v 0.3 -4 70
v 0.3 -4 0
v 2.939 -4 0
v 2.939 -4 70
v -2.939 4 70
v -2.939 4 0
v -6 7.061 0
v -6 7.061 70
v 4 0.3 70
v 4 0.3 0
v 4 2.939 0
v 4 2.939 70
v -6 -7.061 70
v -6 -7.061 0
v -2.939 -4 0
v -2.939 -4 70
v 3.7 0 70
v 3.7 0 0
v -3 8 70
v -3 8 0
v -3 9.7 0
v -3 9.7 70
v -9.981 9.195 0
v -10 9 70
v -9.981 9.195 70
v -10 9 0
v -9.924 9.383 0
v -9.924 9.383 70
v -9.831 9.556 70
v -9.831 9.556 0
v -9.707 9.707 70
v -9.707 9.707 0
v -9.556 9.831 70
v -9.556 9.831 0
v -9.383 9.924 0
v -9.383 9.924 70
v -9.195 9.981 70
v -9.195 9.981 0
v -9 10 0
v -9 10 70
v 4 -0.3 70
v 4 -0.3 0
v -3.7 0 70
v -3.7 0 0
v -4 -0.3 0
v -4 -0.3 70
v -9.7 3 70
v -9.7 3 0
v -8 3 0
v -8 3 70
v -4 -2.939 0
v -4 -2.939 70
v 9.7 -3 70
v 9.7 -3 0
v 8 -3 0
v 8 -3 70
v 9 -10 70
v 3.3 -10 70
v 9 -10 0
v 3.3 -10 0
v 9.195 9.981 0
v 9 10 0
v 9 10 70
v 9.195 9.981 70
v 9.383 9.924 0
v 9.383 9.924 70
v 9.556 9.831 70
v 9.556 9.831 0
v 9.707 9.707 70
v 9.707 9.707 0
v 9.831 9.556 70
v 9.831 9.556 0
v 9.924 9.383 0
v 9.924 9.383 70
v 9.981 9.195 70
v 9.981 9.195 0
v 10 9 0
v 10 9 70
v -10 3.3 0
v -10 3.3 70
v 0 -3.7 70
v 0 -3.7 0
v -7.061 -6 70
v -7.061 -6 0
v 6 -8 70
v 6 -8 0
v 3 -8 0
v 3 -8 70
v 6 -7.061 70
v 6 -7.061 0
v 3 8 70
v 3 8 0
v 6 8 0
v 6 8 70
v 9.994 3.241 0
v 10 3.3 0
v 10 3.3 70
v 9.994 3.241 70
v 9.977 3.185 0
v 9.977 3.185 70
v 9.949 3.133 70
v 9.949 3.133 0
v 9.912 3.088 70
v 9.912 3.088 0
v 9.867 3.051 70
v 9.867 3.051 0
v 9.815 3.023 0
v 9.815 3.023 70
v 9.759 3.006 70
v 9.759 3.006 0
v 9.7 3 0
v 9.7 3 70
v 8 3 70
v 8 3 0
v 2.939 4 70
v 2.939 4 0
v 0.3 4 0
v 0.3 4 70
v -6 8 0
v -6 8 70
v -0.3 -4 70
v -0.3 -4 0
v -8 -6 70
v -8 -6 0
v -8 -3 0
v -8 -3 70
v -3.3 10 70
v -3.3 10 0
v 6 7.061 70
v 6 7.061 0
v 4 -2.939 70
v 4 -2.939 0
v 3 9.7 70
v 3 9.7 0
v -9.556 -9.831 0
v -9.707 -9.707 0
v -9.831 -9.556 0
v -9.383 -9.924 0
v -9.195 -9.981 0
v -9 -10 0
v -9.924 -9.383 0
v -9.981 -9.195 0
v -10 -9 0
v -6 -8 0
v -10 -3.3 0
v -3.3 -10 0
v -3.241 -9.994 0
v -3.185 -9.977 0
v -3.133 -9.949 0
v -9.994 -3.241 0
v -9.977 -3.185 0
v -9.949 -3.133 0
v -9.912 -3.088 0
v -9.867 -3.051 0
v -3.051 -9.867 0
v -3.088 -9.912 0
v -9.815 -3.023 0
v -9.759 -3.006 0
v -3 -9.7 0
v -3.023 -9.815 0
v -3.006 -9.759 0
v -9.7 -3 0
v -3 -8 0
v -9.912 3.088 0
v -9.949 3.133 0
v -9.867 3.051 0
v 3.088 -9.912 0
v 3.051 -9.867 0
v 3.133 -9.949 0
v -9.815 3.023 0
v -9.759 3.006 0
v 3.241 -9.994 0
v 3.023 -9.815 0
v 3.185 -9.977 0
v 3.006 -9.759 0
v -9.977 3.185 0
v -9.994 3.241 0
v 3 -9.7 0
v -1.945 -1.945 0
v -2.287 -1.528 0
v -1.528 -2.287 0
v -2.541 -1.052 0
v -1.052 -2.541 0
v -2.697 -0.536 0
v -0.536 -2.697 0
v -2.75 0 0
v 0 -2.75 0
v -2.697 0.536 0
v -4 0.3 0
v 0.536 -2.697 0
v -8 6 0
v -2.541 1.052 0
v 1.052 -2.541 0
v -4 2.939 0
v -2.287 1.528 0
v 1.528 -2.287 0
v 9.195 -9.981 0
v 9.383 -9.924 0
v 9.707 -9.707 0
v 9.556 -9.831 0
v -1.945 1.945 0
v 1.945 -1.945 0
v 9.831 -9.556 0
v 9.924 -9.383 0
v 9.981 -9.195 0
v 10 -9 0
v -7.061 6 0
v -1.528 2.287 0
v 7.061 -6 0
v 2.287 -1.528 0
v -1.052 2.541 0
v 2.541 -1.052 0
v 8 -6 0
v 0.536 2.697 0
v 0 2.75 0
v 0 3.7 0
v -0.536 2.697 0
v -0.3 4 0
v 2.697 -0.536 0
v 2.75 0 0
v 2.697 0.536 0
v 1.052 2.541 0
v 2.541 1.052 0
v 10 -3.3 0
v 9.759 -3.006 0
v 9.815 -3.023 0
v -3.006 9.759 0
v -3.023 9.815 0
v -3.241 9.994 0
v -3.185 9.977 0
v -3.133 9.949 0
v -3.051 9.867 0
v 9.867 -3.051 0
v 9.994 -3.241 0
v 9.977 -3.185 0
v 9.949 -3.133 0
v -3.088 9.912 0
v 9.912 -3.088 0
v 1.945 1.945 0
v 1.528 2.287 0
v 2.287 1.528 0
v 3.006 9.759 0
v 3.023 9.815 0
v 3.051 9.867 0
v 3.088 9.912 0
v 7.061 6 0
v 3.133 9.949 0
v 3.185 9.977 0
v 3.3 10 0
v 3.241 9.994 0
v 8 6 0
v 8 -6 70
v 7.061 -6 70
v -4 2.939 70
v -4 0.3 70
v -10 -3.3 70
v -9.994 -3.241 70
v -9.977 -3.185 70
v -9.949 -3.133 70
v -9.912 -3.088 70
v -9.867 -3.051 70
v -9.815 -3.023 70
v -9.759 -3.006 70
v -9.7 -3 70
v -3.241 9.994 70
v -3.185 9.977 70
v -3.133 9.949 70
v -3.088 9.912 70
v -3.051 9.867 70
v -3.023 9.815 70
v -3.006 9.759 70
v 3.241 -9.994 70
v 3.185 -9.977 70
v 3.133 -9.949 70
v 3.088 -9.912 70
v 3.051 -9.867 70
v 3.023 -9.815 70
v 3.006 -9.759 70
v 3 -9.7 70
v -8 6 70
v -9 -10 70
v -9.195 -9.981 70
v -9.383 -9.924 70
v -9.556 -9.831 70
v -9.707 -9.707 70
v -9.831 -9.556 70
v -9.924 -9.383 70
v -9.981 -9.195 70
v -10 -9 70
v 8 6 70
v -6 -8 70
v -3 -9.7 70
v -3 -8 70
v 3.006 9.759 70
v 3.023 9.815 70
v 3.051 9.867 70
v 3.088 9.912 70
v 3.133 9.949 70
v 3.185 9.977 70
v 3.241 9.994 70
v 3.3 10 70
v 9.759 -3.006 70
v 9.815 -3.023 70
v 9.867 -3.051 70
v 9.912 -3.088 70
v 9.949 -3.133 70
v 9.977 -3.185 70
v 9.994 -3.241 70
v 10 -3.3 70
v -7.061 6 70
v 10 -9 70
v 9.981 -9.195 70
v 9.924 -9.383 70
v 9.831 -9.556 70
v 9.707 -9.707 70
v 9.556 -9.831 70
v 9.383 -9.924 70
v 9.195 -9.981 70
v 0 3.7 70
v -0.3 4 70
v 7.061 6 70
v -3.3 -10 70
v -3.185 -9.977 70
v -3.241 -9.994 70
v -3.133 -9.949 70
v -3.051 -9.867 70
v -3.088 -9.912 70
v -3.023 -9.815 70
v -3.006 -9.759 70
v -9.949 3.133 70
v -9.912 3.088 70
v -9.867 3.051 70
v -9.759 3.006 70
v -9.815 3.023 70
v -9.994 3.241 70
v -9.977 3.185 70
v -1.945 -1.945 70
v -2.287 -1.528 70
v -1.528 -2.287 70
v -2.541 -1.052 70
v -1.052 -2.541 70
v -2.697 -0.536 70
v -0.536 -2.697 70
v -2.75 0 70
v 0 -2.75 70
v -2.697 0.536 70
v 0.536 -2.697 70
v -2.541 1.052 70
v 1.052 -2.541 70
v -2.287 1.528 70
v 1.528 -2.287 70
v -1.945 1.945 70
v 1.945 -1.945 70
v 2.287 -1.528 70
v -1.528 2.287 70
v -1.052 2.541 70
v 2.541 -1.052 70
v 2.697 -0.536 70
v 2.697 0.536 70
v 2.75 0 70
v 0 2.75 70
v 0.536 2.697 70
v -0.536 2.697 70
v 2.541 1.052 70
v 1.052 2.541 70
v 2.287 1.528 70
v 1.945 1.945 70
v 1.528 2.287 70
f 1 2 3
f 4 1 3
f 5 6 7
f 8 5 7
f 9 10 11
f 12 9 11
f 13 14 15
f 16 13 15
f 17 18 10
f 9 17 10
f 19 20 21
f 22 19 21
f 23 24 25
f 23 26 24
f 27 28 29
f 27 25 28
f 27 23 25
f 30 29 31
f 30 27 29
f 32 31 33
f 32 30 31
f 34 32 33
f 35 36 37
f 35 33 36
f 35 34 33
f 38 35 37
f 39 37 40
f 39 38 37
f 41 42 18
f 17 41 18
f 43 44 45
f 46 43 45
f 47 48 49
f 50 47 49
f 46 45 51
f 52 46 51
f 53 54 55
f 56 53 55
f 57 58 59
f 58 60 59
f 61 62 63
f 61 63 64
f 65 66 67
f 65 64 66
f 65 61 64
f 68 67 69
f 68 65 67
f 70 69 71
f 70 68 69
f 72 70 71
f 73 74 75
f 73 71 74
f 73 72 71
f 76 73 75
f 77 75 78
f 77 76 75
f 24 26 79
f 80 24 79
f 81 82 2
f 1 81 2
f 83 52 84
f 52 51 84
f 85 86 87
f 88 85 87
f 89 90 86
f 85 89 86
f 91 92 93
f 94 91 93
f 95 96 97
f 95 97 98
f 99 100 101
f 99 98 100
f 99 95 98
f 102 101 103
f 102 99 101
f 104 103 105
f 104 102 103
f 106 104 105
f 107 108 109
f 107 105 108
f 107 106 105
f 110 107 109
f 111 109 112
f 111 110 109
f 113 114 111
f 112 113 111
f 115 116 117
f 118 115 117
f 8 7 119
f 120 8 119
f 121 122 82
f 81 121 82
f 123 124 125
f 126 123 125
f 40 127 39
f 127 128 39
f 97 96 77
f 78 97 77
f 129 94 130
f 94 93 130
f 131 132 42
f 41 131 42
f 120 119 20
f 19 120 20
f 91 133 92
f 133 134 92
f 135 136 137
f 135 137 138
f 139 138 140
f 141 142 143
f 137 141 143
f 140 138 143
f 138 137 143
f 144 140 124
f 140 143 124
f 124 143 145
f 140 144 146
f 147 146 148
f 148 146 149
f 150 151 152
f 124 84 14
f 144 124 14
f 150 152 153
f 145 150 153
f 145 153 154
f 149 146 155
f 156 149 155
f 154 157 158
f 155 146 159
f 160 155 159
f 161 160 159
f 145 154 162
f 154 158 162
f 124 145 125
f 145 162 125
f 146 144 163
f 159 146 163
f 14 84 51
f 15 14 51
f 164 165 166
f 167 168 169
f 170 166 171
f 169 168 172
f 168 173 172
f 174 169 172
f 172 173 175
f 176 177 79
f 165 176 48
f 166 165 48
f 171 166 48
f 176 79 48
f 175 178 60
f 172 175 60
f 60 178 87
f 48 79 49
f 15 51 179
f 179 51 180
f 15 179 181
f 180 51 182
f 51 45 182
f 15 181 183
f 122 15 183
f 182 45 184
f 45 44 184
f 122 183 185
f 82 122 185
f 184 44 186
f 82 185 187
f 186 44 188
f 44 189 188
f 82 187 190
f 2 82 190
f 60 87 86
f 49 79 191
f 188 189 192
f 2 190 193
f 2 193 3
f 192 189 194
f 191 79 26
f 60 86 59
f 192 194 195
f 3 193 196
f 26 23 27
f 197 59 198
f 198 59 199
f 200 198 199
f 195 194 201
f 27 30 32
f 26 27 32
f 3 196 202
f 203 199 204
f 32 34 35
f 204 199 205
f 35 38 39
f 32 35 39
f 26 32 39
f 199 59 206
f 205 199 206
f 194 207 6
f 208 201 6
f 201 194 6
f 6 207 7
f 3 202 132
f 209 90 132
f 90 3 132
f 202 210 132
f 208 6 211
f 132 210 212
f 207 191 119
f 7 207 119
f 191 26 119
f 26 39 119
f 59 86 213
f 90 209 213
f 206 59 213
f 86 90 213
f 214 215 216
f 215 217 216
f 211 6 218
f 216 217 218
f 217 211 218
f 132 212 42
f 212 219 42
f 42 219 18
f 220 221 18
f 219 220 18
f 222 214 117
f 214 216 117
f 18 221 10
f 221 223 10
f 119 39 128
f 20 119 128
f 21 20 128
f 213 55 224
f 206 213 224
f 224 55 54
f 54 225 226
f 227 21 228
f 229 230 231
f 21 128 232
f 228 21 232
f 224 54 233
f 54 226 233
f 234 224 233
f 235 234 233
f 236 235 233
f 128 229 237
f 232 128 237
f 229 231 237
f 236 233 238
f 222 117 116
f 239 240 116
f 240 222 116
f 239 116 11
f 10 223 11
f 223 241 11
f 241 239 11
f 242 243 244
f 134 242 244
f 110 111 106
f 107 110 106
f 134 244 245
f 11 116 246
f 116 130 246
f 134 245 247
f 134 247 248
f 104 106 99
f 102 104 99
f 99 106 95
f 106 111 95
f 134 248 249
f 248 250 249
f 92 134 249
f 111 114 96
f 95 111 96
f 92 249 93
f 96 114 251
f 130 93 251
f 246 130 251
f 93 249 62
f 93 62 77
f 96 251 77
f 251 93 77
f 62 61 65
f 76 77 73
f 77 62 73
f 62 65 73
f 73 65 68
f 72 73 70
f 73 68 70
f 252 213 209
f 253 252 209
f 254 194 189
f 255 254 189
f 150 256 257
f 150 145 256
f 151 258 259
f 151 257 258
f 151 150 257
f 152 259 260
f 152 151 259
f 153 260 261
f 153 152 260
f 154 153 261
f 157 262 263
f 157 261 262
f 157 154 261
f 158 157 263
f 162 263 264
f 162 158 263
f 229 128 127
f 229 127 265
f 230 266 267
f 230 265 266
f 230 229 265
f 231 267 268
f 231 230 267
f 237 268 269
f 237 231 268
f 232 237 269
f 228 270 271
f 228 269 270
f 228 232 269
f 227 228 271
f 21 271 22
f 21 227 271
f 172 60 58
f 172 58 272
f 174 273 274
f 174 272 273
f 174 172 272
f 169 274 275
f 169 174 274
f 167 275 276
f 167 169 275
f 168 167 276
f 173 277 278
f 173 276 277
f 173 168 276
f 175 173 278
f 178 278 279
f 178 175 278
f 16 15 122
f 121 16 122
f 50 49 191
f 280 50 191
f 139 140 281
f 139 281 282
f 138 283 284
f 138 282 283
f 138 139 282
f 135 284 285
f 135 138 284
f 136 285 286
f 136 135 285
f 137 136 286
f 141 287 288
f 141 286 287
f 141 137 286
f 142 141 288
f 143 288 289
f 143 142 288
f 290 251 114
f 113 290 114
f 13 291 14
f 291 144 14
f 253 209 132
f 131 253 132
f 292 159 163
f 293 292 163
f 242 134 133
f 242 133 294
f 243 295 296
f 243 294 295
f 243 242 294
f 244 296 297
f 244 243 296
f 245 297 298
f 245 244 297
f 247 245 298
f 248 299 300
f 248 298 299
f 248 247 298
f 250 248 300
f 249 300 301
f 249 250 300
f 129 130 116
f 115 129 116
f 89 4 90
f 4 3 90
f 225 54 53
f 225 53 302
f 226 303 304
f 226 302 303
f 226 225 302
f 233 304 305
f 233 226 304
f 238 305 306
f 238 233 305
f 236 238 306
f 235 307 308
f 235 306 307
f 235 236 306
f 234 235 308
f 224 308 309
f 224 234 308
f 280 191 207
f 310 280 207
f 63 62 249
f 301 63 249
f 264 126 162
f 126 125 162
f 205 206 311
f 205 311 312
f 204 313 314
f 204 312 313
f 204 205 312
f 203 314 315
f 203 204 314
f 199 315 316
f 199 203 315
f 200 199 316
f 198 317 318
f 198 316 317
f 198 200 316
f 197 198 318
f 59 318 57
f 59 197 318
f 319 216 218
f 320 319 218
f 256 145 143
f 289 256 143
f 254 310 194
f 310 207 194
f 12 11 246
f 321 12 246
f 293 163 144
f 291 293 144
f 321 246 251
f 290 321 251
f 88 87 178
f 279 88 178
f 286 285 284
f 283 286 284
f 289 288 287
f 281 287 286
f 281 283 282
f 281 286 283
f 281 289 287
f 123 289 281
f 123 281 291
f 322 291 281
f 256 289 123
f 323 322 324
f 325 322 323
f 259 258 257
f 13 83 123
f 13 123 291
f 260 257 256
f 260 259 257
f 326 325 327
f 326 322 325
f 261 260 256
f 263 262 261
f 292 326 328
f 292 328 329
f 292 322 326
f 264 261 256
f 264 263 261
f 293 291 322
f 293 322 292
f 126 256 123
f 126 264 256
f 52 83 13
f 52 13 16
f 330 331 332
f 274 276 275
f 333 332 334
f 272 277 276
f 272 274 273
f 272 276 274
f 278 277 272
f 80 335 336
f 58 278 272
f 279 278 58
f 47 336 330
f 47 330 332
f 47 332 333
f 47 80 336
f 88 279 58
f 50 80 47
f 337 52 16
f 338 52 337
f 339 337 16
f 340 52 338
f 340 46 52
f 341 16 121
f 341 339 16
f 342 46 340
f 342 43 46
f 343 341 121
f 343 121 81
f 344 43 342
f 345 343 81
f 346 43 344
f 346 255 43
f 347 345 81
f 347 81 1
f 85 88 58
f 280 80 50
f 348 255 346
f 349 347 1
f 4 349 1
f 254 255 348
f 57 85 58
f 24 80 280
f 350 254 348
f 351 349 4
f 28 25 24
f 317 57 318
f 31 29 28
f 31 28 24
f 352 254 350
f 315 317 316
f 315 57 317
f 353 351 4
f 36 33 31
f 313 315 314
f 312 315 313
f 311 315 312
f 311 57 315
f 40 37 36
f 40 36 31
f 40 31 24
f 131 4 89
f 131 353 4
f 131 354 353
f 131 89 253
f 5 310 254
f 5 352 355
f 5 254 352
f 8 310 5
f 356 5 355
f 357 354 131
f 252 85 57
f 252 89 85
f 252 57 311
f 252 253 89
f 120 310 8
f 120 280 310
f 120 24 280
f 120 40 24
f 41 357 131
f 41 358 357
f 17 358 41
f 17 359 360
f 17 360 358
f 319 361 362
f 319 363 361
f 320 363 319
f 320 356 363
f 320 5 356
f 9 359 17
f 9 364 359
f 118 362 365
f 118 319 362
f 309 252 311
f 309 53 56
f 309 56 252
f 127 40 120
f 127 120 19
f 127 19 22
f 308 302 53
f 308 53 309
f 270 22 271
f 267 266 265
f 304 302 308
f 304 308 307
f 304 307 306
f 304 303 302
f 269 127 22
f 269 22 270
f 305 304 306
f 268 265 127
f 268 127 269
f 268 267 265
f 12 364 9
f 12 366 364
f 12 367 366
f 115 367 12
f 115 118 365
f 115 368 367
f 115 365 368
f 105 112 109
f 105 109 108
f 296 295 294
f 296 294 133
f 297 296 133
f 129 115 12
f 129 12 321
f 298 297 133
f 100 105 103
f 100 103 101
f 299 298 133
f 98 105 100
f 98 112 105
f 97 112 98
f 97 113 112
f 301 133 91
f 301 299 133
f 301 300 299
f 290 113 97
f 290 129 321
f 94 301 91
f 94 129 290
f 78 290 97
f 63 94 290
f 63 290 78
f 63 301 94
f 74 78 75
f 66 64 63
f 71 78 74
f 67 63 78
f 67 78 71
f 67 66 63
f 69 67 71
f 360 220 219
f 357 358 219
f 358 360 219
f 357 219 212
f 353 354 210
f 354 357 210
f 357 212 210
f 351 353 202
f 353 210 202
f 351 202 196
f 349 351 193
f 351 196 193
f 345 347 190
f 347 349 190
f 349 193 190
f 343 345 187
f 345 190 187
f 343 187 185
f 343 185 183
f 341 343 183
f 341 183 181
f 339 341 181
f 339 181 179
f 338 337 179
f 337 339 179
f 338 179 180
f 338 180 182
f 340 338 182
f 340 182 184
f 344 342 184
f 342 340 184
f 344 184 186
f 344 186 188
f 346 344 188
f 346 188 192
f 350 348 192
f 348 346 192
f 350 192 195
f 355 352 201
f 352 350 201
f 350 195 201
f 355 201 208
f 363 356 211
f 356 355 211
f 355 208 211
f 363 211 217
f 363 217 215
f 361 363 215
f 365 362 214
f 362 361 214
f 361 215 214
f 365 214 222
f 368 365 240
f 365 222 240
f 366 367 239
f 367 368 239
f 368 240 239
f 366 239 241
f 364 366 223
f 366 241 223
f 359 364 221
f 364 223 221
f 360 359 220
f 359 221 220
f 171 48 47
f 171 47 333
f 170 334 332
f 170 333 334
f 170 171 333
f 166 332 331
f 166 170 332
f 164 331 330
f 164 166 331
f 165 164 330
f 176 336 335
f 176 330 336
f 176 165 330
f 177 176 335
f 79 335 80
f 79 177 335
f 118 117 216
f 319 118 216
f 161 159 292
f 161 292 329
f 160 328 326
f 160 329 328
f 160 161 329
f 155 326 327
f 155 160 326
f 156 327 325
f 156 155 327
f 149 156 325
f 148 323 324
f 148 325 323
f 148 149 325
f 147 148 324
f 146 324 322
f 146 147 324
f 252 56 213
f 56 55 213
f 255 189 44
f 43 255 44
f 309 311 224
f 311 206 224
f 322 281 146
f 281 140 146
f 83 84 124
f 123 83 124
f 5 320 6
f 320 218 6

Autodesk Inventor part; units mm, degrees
ref_plane "Startebene" through (0, 0, 0) normal (0, 0, 1) x (1, 0, 0)
ref_plane "Endebene" through (0, 0, 320) normal (0, 0, 1) x (1, 0, 0)
ref_plane "Startebene1" through (0, 0, 0) normal (0, 0, 1) x (1, 0, 0)
ref_plane "Endebene1" through (0, 0, 40) normal (0, 0, 1) x (1, 0, 0)
ref_plane "Startebene2" through (0, 0, 0) normal (0, 0, 1) x (1, 0, 0)
ref_plane "Endebene2" through (0, 0, 40) normal (0, 0, 1) x (1, 0, 0)
ref_plane "Startebene3" through (0, 0, 0) normal (0, 0, 1) x (1, 0, 0)
ref_plane "Endebene3" through (0, 0, 70) normal (0, 0, 1) x (1, 0, 0)
sketch "Skizze" plane through (0, 0, 0) normal (0, 0, 1) x (1, 0, 0)
  line L0 (-10, 9) -> (-10, 3.3)
  arc A0 (-10, 3.3) -> (-9.7, 3) centre (-9.7, 3.3) ccw
  line L1 (-9.7, 3) -> (-8, 3)
  line L2 (-8, 3) -> (-8, 6)
  line L3 (-8, 6) -> (-7.0607, 6)
  line L4 (-7.0607, 6) -> (-4, 2.9393)
  line L5 (-4, 2.9393) -> (-4, 0.3)
  line L6 (-4, 0.3) -> (-3.7, 0)
  line L7 (-3.7, 0) -> (-4, -0.3)
  line L8 (-4, -0.3) -> (-4, -2.9393)
  line L9 (-4, -2.9393) -> (-7.0607, -6)
  line L10 (-7.0607, -6) -> (-8, -6)
  line L11 (-8, -6) -> (-8, -3)
  line L12 (-8, -3) -> (-9.7, -3)
  arc A1 (-9.7, -3) -> (-10, -3.3) centre (-9.7, -3.3) ccw
  line L13 (-10, -3.3) -> (-10, -9)
  arc A2 (-10, -9) -> (-9, -10) centre (-9, -9) ccw
  line L14 (-9, -10) -> (-3.3, -10)
  arc A3 (-3.3, -10) -> (-3, -9.7) centre (-3.3, -9.7) ccw
  line L15 (-3, -9.7) -> (-3, -8)
  line L16 (-3, -8) -> (-6, -8)
  line L17 (-6, -8) -> (-6, -7.0607)
  line L18 (-6, -7.0607) -> (-2.9393, -4)
  line L19 (-2.9393, -4) -> (-0.3, -4)
  line L20 (-0.3, -4) -> (0, -3.7)
  line L21 (0, -3.7) -> (0.3, -4)
  line L22 (0.3, -4) -> (2.9393, -4)
  line L23 (2.9393, -4) -> (6, -7.0607)
  line L24 (6, -7.0607) -> (6, -8)
  line L25 (6, -8) -> (3, -8)
  line L26 (3, -8) -> (3, -9.7)
  arc A4 (3, -9.7) -> (3.3, -10) centre (3.3, -9.7) ccw
  line L27 (3.3, -10) -> (9, -10)
  arc A5 (9, -10) -> (10, -9) centre (9, -9) ccw
  line L28 (10, -9) -> (10, -3.3)
  arc A6 (10, -3.3) -> (9.7, -3) centre (9.7, -3.3) ccw
  line L29 (9.7, -3) -> (8, -3)
  line L30 (8, -3) -> (8, -6)
  line L31 (8, -6) -> (7.0607, -6)
  line L32 (7.0607, -6) -> (4, -2.9393)
  line L33 (4, -2.9393) -> (4, -0.3)
  line L34 (4, -0.3) -> (3.7, 0)
  line L35 (3.7, 0) -> (4, 0.3)
  line L36 (4, 0.3) -> (4, 2.9393)
  line L37 (4, 2.9393) -> (7.0607, 6)
  line L38 (7.0607, 6) -> (8, 6)
  line L39 (8, 6) -> (8, 3)
  line L40 (8, 3) -> (9.7, 3)
  arc A7 (9.7, 3) -> (10, 3.3) centre (9.7, 3.3) ccw
  line L41 (10, 3.3) -> (10, 9)
  arc A8 (10, 9) -> (9, 10) centre (9, 9) ccw
  line L42 (9, 10) -> (3.3, 10)
  arc A9 (3.3, 10) -> (3, 9.7) centre (3.3, 9.7) ccw
  line L43 (3, 9.7) -> (3, 8)
  line L44 (3, 8) -> (6, 8)
  line L45 (6, 8) -> (6, 7.0607)
  line L46 (6, 7.0607) -> (2.9393, 4)
  line L47 (2.9393, 4) -> (0.3, 4)
  line L48 (0.3, 4) -> (0, 3.7)
  line L49 (0, 3.7) -> (-0.3, 4)
  line L50 (-0.3, 4) -> (-2.9393, 4)
  line L51 (-2.9393, 4) -> (-6, 7.0607)
  line L52 (-6, 7.0607) -> (-6, 8)
  line L53 (-6, 8) -> (-3, 8)
  line L54 (-3, 8) -> (-3, 9.7)
  arc A10 (-3, 9.7) -> (-3.3, 10) centre (-3.3, 9.7) ccw
  line L55 (-3.3, 10) -> (-9, 10)
  arc A11 (-9, 10) -> (-10, 9) centre (-9, 9) ccw
  circle A12 centre (0, 0) radius 2.75
  dimension "d2" = 5.5
  dimension "d3" = 10
  dimension "d4" = 10
  dimension "d5" = 5.7
  dimension "d6" = 5.7
  dimension "d7" = 1.7
  dimension "d8" = 3
  dimension "d9" = 0.3
  dimension "d10" = 90
  dimension "d11" = 45
  dimension "d12" = 45
  dimension "d13" = 45
  dimension "d14" = 90
  dimension "d15" = 90
  dimension "d16" = 45
  dimension "d17" = 45
  dimension "d18" = 45
  dimension "d19" = 45
  dimension "d20" = 90
  dimension "d21" = 90
  dimension "d22" = 45
  dimension "d23" = 45
  dimension "d24" = 90
  dimension "d25" = 90
  dimension "d26" = 90
  dimension "d27" = 90
  dimension "d28" = 90
  dimension "d29" = 90
  dimension "d30" = 90
  dimension "d31" = 90
  dimension "d32" = 90
  dimension "d33" = 90
  dimension "d34" = 90
  dimension "d35" = 90
  dimension "d36" = 90
  dimension "d37" = 90
  dimension "d38" = 90
  dimension "d39" = 4
  dimension "d40" = 6
  dimension "d41" = 13
  dimension "d42" = 14
  dimension "d43" = 16
  dimension "d44" = 18
  dimension "d45" = 3
  dimension "d46" = 9
  dimension "d47" = 7
  dimension "d48" = 1
  dimension "d49" = 7
  dimension "d50" = 1.5
  dimension "d51" = 1.8663
  dimension "d52" = 3.3663
  dimension "d53" = 1.5
  dimension "d54" = 1.8663
  dimension "d55" = 3.3663
  dimension "d56" = 4
  dimension "d57" = 10.8187
  dimension "d58" = 1.9092
  dimension "d59" = 5
  dimension "d60" = 13
  dimension "d61" = 13
  dimension "d62" = 16.0513
  dimension "d63" = 3.3234
  dimension "d64" = 14
  dimension "d65" = 12.685
extrude "Körper" add sketch "Skizze" along normal up to surface (70 mm away) from surface at 0
sketch "Skizze21" plane through (0, 0, 0) normal (0, 0, 1) x (1, 0, 0)
  line L0 (0, 0) -> (10, 0)
ref_plane "Arbeitsebene18" through (0, 0, 0) normal (0, -1, 0) x (1, 0, 0)
sketch "Skizze22" plane through (0, 0, 0) normal (0, -1, 0) x (1, 0, 0)
  line L0 (-2, 0) -> (12, 0)
  line L1 (-2, 70) -> (12, 70)
  dimension "d80" = 70
equation "\"G_OFFSET_START\" = 0"
equation "\"G_OFFSET_END\" = 0"
equation "\"G_L\" = d80"
equation "\"G_OFFSET_START1\" = 0"
equation "\"G_OFFSET_END1\" = 0"
equation "\"G_OFFSET_START2\" = 0"
equation "\"G_OFFSET_END2\" = 0"
equation "\"G_OFFSET_START3\" = 0"
equation "\"G_OFFSET_END3\" = 0"
properties part number "Alu Profil 20x20 - AP2020"
